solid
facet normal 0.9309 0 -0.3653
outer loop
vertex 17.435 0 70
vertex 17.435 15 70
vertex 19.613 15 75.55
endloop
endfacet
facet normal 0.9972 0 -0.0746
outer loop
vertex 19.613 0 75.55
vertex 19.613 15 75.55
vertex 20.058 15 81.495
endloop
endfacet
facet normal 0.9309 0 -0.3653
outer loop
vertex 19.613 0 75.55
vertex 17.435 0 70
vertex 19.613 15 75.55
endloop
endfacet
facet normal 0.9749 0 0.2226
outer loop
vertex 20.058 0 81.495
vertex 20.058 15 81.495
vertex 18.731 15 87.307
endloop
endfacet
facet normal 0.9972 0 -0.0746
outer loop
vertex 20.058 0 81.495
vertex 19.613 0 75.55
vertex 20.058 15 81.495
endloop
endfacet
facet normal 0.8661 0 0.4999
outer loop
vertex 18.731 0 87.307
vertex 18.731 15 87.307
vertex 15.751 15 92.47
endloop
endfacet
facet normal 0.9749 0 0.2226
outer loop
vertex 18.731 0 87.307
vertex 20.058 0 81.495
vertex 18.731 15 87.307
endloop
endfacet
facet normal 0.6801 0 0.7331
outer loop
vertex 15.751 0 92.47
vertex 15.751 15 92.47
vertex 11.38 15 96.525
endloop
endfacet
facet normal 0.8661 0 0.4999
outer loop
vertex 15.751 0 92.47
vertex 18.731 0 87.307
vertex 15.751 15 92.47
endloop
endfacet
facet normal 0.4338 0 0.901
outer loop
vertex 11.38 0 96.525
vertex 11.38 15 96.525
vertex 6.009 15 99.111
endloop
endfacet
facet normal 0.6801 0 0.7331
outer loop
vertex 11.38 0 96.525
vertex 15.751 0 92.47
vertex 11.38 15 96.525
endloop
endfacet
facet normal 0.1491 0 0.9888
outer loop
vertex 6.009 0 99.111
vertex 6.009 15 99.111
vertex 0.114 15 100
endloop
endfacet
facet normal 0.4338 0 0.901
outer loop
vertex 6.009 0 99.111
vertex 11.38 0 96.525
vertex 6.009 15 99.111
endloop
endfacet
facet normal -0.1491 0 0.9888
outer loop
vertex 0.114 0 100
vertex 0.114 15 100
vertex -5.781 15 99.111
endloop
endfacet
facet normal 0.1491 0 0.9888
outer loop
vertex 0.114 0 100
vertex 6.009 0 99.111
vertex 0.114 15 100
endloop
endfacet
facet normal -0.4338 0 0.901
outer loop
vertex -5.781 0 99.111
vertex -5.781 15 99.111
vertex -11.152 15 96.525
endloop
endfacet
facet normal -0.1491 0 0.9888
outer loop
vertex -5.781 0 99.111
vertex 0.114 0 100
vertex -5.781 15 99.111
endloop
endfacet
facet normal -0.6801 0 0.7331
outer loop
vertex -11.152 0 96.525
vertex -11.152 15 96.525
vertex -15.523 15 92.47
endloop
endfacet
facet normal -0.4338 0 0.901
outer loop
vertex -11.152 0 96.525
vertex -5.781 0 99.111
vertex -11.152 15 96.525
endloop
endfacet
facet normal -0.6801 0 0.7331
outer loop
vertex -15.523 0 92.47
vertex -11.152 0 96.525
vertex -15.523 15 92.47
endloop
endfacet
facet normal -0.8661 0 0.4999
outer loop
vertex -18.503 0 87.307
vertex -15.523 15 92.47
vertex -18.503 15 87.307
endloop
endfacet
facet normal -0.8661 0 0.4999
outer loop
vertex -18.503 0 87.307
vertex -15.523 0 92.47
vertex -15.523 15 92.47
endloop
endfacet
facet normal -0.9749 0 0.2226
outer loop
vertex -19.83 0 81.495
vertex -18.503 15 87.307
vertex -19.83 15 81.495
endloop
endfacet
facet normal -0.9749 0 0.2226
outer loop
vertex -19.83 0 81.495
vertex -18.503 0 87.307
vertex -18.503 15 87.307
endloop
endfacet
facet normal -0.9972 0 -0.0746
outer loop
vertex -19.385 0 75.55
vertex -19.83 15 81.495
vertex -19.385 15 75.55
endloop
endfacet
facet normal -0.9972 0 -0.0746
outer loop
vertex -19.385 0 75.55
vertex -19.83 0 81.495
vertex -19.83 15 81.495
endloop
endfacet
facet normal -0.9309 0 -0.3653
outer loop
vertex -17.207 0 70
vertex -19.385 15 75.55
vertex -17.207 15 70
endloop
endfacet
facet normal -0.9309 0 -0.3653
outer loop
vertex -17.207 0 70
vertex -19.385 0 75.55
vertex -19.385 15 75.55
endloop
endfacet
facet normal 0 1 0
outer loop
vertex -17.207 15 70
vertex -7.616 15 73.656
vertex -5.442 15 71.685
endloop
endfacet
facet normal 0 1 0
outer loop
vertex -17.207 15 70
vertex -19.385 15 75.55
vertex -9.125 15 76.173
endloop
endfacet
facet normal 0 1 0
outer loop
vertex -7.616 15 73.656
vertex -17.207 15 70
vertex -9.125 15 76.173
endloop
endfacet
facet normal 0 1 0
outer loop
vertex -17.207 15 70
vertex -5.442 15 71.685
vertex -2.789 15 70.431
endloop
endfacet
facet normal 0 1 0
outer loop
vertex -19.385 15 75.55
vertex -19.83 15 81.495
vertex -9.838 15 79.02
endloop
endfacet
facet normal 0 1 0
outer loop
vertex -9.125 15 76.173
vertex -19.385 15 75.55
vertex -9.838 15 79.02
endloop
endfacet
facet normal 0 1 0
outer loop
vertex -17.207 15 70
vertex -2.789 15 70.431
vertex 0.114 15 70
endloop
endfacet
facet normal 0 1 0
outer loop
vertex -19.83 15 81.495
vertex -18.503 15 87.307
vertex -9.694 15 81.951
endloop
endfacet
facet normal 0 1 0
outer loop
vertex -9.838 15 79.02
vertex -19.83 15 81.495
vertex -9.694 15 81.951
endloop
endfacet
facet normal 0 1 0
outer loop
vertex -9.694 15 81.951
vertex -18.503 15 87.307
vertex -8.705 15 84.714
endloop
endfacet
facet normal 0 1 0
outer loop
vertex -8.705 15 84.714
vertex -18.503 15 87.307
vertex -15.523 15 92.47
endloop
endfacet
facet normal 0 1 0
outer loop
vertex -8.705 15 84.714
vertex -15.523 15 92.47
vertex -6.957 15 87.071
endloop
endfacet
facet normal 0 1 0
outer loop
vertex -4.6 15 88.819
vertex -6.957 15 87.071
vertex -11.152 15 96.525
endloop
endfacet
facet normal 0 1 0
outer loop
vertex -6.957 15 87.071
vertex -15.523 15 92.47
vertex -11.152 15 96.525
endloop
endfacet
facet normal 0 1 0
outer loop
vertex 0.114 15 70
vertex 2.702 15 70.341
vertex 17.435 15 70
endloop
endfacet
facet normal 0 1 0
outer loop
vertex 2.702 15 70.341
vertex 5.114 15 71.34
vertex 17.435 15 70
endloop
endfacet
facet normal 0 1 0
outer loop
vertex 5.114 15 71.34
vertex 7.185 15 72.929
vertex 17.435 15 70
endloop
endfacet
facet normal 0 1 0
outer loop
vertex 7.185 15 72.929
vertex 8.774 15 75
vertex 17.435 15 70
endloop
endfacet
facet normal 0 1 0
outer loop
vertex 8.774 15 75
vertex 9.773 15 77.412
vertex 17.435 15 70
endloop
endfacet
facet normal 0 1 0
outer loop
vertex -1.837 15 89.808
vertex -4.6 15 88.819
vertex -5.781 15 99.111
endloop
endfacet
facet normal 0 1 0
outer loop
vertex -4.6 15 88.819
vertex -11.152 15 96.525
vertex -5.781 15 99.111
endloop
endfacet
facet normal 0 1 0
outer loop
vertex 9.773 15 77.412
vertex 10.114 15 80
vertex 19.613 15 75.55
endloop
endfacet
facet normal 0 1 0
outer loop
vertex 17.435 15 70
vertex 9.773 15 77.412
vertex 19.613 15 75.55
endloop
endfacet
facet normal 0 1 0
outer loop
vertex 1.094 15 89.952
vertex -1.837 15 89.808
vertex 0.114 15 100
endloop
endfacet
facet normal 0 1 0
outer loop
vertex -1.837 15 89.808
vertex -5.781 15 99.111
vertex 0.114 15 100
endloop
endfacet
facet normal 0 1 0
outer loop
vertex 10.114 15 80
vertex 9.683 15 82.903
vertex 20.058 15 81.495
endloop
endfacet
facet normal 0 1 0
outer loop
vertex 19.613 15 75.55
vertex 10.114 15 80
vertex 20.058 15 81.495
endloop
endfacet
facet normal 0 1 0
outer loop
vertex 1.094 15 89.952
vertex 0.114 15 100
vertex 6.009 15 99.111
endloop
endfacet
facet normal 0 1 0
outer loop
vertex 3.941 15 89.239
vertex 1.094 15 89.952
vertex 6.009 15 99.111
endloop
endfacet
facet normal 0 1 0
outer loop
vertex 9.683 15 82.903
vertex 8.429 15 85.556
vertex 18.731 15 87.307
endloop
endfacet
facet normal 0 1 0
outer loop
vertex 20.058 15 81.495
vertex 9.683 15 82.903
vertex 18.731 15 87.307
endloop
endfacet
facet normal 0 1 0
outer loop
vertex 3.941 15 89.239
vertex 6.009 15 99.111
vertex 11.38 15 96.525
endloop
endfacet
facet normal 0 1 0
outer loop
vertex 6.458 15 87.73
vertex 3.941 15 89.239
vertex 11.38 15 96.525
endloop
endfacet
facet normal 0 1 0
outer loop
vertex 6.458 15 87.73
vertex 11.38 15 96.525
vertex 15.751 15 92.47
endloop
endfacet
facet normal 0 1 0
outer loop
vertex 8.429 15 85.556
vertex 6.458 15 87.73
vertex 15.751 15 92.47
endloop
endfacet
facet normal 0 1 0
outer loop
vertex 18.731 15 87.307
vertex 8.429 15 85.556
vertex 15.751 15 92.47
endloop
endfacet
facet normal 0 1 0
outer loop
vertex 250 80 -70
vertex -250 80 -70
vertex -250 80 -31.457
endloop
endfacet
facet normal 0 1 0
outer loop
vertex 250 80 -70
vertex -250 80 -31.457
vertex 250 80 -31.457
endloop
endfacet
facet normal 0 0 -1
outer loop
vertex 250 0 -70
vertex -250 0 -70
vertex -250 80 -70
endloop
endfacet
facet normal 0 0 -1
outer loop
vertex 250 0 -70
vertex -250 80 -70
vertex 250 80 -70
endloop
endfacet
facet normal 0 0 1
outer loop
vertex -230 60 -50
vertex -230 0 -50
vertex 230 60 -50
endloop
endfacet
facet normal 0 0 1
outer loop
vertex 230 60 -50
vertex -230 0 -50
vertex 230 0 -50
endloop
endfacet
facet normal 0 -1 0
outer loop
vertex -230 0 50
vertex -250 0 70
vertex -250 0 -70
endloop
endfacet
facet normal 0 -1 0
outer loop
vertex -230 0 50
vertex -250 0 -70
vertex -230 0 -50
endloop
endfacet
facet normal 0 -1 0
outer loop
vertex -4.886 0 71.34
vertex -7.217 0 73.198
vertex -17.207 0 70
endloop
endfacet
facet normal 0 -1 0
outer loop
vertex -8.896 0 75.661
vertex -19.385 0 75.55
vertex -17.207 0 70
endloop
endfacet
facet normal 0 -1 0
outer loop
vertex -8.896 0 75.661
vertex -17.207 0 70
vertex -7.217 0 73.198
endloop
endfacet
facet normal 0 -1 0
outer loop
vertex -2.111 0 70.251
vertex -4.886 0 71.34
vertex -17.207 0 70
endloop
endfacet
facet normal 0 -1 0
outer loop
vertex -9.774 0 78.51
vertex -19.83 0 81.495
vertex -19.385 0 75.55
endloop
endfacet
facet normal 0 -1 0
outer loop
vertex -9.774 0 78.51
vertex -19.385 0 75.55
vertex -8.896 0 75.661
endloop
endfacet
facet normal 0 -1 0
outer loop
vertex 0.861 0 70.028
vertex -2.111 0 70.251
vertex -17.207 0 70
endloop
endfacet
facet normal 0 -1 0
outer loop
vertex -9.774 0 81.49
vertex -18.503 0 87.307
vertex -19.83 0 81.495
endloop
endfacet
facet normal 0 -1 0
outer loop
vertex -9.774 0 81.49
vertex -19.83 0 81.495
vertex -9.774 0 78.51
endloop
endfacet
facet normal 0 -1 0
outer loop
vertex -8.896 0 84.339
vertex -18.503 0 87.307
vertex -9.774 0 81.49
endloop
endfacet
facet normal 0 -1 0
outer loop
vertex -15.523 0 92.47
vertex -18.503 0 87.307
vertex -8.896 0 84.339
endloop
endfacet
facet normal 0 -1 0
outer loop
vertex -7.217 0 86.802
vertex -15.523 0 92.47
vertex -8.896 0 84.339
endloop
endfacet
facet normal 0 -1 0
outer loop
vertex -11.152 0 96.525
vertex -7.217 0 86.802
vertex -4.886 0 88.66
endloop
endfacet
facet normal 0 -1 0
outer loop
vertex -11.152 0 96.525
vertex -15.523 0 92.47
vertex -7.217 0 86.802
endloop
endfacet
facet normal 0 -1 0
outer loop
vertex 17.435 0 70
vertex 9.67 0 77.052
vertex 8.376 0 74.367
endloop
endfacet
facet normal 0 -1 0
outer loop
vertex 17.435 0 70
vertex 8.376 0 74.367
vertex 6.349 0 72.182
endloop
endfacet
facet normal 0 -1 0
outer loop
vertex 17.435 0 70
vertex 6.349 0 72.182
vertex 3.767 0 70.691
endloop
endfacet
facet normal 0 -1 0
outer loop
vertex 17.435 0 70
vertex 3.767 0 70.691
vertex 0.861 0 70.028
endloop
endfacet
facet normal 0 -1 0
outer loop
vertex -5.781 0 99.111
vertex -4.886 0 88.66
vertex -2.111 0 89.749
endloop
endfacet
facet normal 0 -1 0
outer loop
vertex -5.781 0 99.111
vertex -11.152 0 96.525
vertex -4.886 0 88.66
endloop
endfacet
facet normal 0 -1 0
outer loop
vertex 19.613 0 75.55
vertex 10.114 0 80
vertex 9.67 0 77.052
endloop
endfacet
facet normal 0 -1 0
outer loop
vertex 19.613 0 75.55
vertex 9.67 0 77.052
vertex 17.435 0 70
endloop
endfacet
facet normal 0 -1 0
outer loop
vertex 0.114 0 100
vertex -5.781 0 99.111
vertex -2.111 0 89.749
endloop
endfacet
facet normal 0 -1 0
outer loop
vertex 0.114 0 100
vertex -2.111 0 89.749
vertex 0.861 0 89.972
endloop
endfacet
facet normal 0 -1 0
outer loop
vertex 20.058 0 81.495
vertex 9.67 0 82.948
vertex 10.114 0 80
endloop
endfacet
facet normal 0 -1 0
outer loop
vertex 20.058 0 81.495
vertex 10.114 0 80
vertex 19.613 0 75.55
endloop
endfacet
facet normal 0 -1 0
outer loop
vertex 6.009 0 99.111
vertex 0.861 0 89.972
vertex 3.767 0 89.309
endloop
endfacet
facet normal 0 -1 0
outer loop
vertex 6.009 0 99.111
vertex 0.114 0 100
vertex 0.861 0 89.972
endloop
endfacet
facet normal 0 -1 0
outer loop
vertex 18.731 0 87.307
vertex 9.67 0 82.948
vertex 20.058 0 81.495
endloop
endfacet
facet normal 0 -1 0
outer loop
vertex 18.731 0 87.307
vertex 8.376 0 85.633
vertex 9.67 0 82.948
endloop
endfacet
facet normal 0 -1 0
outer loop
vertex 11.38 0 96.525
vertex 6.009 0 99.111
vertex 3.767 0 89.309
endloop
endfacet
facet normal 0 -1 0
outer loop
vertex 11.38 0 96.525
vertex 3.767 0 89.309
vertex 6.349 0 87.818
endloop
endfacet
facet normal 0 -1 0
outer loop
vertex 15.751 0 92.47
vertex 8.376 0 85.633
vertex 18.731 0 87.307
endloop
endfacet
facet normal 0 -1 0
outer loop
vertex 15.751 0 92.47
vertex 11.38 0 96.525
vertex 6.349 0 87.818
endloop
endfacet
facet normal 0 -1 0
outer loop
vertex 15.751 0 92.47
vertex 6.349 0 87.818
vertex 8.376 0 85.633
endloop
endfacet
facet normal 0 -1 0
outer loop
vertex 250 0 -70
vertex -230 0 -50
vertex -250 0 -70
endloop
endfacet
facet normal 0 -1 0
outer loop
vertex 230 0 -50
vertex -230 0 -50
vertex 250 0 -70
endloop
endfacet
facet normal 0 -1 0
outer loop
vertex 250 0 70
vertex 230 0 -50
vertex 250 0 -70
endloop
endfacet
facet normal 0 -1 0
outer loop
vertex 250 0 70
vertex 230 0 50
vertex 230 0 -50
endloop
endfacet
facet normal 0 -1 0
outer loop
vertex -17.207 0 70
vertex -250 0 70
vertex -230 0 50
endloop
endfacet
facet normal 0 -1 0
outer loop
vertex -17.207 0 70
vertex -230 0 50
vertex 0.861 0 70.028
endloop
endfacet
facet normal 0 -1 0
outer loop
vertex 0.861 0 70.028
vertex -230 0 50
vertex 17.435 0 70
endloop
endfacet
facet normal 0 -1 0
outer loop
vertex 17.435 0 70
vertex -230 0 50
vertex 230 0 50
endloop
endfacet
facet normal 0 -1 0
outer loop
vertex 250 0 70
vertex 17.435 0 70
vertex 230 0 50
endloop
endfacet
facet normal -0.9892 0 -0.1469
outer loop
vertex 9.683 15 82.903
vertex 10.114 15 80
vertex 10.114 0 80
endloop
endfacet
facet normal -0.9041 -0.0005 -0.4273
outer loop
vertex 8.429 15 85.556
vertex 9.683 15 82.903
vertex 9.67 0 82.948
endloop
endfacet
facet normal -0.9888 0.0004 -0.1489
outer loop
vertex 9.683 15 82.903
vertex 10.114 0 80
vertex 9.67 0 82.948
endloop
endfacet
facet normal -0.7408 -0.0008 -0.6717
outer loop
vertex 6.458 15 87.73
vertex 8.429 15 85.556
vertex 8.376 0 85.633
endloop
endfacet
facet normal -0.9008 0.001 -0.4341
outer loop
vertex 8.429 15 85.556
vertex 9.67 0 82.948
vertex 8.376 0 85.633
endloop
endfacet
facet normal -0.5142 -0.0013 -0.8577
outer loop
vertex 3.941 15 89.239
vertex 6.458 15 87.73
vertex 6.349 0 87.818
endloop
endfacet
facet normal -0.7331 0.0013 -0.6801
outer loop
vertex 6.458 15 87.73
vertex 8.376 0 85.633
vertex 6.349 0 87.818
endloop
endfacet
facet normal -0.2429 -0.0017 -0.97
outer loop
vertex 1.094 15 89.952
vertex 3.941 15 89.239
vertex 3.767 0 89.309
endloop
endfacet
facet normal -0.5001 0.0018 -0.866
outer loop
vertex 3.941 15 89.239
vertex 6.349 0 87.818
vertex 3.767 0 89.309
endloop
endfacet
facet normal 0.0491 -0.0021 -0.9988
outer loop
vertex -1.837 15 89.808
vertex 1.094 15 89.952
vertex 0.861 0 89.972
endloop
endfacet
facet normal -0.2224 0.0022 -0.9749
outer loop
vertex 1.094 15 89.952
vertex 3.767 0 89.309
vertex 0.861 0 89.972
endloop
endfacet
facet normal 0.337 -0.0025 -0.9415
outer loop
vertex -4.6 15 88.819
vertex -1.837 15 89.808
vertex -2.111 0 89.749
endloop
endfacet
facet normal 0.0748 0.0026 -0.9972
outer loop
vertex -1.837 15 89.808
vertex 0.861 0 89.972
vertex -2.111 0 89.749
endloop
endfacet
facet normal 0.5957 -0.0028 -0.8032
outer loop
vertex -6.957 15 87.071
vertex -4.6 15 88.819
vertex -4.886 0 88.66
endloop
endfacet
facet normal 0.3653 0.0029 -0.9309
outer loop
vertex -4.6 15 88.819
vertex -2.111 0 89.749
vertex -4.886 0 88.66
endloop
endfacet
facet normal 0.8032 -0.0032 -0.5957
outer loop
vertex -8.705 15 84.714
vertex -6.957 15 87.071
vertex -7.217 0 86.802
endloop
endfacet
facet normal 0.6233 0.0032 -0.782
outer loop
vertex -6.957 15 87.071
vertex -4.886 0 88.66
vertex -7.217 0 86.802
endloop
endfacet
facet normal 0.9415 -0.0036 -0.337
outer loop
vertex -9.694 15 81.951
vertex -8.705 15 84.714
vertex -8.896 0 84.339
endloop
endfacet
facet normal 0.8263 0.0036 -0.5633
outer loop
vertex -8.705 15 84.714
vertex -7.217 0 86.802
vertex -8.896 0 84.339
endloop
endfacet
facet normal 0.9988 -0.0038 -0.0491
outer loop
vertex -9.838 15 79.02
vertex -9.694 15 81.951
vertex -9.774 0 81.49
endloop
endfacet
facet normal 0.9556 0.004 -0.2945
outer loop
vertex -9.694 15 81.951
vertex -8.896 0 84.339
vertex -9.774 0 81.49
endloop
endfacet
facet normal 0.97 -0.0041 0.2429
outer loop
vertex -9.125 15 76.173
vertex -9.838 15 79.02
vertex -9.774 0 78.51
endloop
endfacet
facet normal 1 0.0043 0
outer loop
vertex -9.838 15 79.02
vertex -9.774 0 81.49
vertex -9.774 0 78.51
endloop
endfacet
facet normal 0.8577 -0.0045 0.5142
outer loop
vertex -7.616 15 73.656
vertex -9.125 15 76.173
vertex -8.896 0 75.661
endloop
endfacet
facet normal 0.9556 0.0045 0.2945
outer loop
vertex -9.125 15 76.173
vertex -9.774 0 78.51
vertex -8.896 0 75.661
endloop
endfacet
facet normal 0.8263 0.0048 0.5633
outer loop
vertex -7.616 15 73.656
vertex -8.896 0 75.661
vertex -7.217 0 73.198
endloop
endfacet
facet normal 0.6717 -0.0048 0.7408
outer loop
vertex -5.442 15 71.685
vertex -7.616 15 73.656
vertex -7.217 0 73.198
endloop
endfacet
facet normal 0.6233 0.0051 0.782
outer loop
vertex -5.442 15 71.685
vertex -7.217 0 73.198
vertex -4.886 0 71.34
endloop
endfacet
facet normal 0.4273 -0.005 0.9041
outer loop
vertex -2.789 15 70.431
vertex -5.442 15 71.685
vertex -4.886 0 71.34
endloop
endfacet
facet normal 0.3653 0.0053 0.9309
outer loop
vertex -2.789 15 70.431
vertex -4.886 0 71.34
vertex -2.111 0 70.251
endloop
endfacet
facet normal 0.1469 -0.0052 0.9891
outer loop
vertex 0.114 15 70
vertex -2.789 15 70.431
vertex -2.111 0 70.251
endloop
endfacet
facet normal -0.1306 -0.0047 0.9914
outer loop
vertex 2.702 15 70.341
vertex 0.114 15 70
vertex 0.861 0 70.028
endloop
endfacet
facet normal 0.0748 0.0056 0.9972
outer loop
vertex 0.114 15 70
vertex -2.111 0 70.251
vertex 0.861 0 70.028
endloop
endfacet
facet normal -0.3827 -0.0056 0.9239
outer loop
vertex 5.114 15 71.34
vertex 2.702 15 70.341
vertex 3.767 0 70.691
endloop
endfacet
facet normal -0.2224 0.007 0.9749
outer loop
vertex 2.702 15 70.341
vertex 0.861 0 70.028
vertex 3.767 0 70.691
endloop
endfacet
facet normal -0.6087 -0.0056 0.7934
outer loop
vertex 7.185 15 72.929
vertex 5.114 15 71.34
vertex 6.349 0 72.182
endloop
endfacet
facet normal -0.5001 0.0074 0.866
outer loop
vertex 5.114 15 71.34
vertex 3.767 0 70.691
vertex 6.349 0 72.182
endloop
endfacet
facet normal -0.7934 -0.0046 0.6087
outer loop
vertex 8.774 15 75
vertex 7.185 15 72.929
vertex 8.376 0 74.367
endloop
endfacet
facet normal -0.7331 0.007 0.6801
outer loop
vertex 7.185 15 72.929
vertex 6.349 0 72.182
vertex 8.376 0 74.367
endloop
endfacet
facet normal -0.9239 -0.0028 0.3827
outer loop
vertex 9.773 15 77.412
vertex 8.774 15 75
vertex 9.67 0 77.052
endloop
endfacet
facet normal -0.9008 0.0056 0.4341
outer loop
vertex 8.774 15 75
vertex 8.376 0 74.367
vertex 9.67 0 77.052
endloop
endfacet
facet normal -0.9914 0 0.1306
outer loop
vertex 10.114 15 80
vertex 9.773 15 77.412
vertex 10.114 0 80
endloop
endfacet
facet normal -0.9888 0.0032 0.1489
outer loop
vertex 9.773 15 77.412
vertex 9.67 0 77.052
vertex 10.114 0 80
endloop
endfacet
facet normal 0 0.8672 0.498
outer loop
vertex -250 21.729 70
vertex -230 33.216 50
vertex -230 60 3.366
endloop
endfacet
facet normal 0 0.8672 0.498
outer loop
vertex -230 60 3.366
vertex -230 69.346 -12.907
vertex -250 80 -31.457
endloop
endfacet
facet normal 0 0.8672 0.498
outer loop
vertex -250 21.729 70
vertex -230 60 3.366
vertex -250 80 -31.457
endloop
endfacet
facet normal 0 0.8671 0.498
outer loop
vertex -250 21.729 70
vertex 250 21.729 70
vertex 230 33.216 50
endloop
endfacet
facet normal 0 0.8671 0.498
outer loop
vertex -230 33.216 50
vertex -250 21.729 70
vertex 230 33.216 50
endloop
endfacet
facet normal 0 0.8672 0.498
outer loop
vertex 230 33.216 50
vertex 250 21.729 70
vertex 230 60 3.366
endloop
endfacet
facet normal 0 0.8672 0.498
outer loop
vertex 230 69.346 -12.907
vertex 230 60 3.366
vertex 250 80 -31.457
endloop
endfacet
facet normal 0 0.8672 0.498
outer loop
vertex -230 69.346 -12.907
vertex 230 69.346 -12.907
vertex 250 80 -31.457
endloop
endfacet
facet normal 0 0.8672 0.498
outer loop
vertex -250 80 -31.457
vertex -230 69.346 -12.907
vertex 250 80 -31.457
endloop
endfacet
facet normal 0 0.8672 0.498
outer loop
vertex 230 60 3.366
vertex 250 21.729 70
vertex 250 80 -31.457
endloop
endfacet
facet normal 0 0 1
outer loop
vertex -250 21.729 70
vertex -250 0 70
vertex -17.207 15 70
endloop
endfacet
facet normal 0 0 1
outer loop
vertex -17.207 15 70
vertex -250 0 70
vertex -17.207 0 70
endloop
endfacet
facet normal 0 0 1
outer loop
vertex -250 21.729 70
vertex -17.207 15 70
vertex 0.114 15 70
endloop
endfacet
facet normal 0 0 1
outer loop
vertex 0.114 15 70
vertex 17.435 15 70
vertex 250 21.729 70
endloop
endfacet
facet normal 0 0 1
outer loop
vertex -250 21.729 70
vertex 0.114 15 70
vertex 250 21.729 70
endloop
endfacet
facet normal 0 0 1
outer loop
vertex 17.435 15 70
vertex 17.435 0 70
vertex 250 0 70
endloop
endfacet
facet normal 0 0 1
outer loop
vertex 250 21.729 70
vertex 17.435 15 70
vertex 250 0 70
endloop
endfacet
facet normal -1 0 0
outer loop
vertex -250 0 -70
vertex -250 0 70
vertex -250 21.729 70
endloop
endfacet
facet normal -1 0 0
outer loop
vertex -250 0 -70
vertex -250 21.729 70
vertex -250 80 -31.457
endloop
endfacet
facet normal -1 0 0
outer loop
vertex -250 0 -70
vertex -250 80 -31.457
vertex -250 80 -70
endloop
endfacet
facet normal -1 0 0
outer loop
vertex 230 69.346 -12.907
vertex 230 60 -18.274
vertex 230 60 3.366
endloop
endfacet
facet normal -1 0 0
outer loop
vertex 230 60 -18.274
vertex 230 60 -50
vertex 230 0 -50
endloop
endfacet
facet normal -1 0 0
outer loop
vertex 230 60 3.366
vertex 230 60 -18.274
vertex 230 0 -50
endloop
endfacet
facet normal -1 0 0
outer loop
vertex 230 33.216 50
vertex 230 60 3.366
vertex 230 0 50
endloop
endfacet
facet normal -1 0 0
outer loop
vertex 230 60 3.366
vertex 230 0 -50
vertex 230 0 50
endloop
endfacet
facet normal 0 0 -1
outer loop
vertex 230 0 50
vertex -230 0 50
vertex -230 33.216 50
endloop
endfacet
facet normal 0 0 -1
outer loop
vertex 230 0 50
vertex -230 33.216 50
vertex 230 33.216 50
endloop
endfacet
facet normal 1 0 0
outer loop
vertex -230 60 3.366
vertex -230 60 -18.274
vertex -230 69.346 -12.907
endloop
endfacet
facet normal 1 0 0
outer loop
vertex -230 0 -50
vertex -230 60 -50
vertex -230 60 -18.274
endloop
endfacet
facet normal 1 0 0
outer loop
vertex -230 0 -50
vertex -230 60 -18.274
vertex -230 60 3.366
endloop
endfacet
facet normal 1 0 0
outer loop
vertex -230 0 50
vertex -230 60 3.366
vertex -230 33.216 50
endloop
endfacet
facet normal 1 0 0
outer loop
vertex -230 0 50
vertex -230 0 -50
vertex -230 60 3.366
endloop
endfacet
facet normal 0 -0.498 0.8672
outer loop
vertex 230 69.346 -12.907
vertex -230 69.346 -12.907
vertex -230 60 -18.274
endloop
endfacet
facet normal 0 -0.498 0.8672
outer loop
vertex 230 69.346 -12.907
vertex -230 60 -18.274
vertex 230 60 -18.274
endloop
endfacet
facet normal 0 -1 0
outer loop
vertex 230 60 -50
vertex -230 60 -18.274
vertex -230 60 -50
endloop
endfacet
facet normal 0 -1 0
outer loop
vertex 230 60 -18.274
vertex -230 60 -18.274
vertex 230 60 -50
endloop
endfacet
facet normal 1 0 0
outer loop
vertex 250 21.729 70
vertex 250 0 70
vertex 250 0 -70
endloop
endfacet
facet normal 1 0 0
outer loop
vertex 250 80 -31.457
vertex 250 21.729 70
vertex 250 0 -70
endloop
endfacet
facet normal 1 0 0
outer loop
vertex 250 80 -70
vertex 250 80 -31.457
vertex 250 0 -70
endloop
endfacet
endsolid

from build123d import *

# Parameters (mm, degrees)
SKETCH_1_W          = 500
SKETCH_1_H          = 140
EXTRUDE_1_DEPTH     = 80
SKETCH_2_W          = 460
SKETCH_2_H          = 100
CUT_EXTRUDE_1_DEPTH = 60
SKETCH_6_R          = 20
SKETCH_6_R_2        = 10
EXTRUDE_4_DEPTH     = 15
CUT_EXTRUDE_2_DEPTH = 517.139516023
SKETCH_8_W          = 460
SKETCH_8_H          = 18.765324385
CUT_EXTRUDE_3_DEPTH = 15


with BuildPart() as part:
    # 草圖1 → 填料-伸長1 (new body)
    with BuildSketch(Plane(origin=(0, 0, 0), x_dir=(1, 0, 0), z_dir=(0, 1, 0))):
        Rectangle(SKETCH_1_W, SKETCH_1_H)
    extrude(amount=EXTRUDE_1_DEPTH)

    # 草圖2 → 除料-伸長1 (cut)
    with BuildSketch(Plane.XZ):
        Rectangle(SKETCH_2_W, SKETCH_2_H)
    extrude(amount=-CUT_EXTRUDE_1_DEPTH, mode=Mode.SUBTRACT)

    # 草圖6 → 伸長-薄件4 (add)
    with BuildSketch(Plane.XZ):
        with Locations((0.114006629, 80)):
            Circle(SKETCH_6_R)
        with Locations((0.114006629, 80)):
            Circle(SKETCH_6_R_2, mode=Mode.SUBTRACT)
    extrude(amount=-EXTRUDE_4_DEPTH)

    # 草圖7 → 除料-伸長2 (cut, through all)
    with BuildSketch(Plane(origin=(250, 0, 0), x_dir=(0, 0, -1), z_dir=(1, 0, 0))):
        Polygon((-70, 21.729405289), (31.457073642, 80), (-70, 80), align=None)
    extrude(amount=-CUT_EXTRUDE_2_DEPTH, mode=Mode.SUBTRACT)

    # 草圖8 → 除料-伸長3 (cut)
    with BuildSketch(Plane(origin=(0, 46.570964705, 26.747448081), x_dir=(1, 0, 0), z_dir=(0, 0.8671544755717103, 0.4980392710378893))):
        with Locations((0, 36.346470221)):
            Rectangle(SKETCH_8_W, SKETCH_8_H)
    extrude(amount=-CUT_EXTRUDE_3_DEPTH, mode=Mode.SUBTRACT)


solid = part.part
